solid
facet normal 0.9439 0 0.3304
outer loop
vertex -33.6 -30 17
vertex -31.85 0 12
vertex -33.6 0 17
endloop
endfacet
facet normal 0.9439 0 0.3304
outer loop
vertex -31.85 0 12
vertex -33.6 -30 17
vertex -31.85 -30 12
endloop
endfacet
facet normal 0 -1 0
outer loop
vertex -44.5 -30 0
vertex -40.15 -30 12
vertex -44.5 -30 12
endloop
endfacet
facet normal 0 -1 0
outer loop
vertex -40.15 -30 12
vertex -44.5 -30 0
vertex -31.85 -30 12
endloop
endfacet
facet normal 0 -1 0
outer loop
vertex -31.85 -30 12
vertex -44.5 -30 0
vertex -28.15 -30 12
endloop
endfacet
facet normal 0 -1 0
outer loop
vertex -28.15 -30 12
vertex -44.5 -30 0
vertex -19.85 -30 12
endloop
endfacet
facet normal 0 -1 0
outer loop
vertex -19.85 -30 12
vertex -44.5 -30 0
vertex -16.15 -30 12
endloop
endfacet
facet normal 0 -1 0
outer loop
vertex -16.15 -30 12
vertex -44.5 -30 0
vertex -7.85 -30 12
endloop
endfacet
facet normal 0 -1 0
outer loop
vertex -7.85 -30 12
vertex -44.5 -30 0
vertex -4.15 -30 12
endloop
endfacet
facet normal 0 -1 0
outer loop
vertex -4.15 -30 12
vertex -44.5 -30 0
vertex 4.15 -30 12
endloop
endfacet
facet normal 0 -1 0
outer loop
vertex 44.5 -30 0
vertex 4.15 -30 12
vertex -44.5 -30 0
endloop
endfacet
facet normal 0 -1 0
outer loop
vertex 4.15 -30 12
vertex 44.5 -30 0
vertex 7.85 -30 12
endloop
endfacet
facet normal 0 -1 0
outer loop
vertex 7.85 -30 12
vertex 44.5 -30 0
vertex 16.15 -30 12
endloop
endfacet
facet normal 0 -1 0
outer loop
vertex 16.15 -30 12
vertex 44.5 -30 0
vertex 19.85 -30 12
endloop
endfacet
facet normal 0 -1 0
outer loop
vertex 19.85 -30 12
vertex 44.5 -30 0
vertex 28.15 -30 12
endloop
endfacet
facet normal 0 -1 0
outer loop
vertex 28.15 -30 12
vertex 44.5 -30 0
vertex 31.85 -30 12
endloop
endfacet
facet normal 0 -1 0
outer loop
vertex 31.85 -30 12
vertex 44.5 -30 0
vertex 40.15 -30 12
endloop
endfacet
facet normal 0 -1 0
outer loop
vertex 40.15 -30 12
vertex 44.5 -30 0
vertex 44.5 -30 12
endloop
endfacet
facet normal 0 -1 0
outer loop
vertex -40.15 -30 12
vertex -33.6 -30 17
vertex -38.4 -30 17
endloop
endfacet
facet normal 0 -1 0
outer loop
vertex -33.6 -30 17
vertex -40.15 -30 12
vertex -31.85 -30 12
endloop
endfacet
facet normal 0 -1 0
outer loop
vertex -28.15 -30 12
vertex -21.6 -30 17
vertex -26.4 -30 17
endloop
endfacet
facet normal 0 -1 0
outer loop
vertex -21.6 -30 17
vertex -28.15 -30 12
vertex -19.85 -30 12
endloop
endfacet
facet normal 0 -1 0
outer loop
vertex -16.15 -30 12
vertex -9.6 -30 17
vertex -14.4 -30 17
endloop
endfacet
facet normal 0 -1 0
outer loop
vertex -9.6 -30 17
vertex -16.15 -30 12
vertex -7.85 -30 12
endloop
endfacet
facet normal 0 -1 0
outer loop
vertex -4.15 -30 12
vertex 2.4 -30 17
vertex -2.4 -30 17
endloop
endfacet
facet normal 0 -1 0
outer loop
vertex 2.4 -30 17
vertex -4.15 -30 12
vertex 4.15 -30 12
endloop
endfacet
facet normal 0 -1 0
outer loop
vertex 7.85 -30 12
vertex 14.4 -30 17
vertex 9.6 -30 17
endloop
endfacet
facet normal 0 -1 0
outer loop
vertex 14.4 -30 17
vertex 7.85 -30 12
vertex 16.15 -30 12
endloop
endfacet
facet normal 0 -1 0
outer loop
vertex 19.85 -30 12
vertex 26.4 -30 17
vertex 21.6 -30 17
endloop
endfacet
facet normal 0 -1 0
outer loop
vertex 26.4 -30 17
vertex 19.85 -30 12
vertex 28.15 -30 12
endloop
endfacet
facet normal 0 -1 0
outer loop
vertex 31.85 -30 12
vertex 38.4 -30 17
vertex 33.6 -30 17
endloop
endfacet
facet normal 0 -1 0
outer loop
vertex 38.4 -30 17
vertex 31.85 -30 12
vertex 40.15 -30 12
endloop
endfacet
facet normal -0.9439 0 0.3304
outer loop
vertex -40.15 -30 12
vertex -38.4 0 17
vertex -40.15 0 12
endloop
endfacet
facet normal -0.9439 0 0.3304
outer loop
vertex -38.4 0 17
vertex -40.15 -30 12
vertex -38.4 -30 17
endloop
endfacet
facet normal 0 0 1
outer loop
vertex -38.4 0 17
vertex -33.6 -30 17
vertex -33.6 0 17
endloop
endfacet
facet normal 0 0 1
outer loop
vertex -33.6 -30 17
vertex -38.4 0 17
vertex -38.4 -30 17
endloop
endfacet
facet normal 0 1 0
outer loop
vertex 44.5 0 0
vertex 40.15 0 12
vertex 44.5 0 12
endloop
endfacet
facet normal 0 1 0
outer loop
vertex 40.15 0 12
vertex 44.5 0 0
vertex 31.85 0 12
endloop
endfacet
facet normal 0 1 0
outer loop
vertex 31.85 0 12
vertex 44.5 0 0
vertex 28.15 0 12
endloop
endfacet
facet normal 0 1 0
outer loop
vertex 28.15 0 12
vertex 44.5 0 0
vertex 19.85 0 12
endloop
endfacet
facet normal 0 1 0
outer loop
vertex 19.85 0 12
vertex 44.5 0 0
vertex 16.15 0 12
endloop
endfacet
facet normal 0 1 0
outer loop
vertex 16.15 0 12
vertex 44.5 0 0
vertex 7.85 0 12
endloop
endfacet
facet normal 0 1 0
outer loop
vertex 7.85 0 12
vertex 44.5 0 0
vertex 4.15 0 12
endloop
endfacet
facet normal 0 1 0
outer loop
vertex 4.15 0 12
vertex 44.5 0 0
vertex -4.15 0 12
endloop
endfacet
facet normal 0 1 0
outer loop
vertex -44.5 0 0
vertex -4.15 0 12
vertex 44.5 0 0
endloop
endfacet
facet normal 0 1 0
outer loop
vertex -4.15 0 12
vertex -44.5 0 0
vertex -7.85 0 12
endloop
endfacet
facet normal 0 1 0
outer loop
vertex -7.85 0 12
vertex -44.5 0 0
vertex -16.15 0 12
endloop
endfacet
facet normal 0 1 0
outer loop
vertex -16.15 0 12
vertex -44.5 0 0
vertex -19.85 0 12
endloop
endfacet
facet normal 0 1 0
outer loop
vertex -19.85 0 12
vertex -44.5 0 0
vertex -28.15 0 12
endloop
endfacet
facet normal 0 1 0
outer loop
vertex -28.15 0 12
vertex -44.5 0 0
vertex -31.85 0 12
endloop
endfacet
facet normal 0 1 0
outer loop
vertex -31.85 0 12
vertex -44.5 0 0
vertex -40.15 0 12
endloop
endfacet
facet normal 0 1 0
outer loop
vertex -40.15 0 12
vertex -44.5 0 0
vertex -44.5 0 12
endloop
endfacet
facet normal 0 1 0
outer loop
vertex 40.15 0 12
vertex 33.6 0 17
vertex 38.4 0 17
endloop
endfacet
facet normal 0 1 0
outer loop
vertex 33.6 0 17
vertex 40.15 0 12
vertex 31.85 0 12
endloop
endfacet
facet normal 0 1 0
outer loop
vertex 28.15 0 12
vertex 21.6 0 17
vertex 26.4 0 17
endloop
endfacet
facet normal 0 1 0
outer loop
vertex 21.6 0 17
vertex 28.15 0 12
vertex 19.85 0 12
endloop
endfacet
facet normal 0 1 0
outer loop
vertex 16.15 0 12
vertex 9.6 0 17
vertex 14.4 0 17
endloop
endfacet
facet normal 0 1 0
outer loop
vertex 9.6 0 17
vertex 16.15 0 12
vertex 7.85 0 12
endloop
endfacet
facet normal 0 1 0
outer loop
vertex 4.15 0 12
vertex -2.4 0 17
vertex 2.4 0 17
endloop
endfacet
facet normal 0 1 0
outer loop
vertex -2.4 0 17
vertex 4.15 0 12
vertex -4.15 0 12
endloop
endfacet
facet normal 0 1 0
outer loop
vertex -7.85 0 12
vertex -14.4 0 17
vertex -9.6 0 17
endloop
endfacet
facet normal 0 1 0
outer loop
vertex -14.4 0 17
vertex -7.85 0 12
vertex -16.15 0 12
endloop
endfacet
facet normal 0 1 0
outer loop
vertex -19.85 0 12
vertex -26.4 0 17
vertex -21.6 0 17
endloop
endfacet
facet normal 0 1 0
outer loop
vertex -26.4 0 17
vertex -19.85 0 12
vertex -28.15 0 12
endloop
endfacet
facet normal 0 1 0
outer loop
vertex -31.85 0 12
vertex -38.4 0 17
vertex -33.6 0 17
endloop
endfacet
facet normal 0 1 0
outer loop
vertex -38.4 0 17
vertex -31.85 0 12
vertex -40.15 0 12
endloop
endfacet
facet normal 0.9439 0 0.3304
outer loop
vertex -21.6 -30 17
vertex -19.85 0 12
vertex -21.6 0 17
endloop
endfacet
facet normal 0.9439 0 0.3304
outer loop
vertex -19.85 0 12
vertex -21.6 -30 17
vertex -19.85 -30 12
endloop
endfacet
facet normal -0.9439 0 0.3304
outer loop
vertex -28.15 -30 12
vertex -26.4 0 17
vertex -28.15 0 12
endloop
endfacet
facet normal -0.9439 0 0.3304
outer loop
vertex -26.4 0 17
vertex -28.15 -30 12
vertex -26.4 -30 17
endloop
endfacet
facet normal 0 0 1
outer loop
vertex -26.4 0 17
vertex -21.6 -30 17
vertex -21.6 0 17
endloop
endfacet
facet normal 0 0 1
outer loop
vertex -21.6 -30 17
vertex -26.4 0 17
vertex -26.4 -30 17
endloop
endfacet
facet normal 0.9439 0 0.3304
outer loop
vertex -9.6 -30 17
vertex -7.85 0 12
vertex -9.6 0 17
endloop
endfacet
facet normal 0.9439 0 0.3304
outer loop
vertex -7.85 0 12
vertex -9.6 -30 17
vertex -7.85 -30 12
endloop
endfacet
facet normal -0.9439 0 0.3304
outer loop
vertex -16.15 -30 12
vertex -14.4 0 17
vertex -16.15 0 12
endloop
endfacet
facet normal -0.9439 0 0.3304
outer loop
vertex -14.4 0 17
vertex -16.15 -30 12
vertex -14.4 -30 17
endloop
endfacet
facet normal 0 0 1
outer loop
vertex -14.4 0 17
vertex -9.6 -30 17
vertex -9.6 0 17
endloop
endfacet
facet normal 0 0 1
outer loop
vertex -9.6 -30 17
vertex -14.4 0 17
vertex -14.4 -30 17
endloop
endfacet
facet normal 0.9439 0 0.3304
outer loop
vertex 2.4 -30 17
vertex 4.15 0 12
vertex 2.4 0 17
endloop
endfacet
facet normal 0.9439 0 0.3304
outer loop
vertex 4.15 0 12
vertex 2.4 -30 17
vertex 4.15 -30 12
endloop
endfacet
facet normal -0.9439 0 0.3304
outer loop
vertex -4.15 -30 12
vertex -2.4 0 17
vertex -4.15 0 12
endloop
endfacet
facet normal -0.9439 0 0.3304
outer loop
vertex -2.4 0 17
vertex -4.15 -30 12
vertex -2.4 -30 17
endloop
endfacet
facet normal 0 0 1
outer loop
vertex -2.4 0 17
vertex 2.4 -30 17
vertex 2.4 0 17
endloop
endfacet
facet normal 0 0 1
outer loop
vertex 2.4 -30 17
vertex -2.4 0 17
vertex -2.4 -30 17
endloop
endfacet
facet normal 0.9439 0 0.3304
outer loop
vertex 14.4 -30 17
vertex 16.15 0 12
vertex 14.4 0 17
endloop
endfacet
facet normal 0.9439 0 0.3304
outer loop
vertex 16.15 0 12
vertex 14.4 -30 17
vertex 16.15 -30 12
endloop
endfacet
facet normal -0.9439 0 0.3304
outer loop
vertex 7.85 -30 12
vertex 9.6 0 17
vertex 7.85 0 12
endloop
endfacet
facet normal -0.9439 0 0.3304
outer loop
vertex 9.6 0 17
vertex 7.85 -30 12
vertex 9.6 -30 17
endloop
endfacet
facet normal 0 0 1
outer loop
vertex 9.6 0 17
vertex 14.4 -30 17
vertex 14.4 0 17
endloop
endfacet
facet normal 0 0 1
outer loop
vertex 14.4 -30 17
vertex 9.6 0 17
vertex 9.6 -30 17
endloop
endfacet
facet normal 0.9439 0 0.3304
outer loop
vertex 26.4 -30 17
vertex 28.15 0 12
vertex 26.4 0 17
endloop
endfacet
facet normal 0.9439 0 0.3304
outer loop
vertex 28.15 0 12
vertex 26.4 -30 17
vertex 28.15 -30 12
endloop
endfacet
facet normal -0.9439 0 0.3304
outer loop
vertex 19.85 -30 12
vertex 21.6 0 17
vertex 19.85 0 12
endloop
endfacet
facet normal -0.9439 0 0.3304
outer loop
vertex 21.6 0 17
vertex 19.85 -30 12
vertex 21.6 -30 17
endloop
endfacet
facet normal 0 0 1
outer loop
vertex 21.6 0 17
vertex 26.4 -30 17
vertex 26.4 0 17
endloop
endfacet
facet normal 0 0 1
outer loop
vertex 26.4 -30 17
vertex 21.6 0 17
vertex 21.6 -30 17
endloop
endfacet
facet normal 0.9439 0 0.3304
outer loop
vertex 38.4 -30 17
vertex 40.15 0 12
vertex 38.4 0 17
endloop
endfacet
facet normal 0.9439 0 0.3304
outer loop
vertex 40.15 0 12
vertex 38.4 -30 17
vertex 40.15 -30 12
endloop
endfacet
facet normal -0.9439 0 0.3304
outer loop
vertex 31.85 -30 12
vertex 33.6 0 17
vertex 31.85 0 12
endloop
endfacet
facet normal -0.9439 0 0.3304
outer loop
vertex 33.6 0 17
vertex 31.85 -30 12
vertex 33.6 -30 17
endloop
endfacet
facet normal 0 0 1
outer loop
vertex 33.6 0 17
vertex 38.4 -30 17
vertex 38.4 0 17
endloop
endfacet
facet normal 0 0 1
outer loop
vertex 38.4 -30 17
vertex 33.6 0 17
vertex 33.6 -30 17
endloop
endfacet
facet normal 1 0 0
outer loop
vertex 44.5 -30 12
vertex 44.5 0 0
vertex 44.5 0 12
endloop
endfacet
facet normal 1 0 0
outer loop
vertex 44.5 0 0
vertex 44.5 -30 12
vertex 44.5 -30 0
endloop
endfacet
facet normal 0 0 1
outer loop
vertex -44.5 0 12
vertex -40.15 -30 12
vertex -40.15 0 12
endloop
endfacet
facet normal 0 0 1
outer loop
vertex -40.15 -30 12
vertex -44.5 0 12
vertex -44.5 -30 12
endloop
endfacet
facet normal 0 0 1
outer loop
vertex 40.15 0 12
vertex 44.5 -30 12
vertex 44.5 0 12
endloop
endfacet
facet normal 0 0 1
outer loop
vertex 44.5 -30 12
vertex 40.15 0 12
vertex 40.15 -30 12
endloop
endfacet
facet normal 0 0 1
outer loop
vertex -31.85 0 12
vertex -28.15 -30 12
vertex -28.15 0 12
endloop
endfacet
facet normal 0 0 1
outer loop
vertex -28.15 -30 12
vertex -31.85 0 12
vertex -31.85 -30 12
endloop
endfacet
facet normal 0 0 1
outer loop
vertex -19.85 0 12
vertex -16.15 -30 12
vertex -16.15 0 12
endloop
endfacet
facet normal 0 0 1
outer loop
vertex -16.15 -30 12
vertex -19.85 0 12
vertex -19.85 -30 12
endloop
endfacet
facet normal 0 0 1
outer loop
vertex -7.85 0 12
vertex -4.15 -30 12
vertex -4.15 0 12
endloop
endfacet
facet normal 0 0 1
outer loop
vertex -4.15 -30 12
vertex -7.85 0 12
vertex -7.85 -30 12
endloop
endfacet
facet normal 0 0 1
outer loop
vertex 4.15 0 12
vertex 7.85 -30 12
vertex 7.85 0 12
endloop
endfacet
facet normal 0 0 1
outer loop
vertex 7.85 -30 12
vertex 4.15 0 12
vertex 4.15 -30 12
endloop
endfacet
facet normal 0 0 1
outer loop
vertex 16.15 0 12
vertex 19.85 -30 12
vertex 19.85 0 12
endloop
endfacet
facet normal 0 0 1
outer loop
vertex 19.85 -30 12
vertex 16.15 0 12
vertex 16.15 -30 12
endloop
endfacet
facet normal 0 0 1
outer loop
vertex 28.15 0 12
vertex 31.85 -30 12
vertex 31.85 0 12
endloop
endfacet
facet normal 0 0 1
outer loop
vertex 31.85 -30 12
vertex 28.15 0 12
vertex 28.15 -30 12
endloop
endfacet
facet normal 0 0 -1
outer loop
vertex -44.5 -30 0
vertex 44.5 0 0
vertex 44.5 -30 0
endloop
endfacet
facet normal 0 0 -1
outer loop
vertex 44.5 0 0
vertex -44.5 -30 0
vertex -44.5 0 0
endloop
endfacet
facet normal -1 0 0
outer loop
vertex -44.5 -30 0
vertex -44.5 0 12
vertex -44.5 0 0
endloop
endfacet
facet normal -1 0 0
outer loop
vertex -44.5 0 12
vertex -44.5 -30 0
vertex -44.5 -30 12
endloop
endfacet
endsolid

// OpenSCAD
$fn = 32;

// ----------------------------------------------------------------------
// Toothed rack, 7 teeth
// 12 mm pitch, 5 mm teeth
// ----------------------------------------------------------------------

// --- parameters (mm) ---
bar_w = 30;     // bar width (Y)
bar_h = 12;     // bar height (Z)
teeth = 7;      // number of teeth
pitch = 12;     // tooth pitch
tooth_h = 5;    // tooth height above the bar
root_w = 9;     // tooth width at the root
crest_w = 4.8;  // tooth width at the crest

// --- derived feature positions (mm) ---
span = (teeth - 1) * pitch;  // = 72   distance between the outer teeth
bar_l = span + root_w + 8;   // = 89   bar length: teeth plus 4 mm at each end
tooth_x = -span / 2;         // = -36   X of the first tooth
height = bar_h + tooth_h;    // = 17   overall height
feature_centers = [
  [tooth_x + 0 * pitch, -bar_w / 2],
  [tooth_x + 1 * pitch, -bar_w / 2],
  [tooth_x + 2 * pitch, -bar_w / 2],
  [tooth_x + 3 * pitch, -bar_w / 2],
  [tooth_x + 4 * pitch, -bar_w / 2],
  [tooth_x + 5 * pitch, -bar_w / 2],
  [tooth_x + 6 * pitch, -bar_w / 2]
];   // tooth centre line, drives the tooth loop

// bar with a rack of teeth, one extruded trapezoium per centre
module rack_tooth() {
  linear_extrude(height = bar_w)
    polygon(points = [
      [0, 0],
      [root_w, 0],
      [root_w / 2 + crest_w / 2, tooth_h + 1],
      [root_w / 2 - crest_w / 2, tooth_h + 1]
    ]);
}

union() {
  translate([-bar_l / 2, -bar_w, 0]) cube([bar_l, bar_w, bar_h]);
  for (centre = feature_centers)
    translate([centre[0] - root_w / 2, 0, bar_h - 1]) rotate([90, 0, 0]) rack_tooth();
}
